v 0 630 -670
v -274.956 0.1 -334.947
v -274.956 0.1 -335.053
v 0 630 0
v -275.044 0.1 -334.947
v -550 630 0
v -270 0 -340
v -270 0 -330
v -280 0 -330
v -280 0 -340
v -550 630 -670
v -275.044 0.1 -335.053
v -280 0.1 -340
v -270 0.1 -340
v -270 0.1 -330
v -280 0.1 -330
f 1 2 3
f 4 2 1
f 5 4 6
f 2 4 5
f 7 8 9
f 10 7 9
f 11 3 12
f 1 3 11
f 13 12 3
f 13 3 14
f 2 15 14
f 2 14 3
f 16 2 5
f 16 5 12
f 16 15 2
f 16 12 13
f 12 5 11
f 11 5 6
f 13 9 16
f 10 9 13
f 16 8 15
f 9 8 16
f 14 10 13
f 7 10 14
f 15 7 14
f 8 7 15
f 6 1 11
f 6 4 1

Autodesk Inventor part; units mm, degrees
ref_plane "YZ Plane" through (0, 0, 0) normal (1, 0, 0) x (0, 1, 0)
ref_plane "XZ Plane" through (0, 0, 0) normal (0, 1, 0) x (-1, 0, 0)
ref_plane "XY Plane" through (0, 0, 0) normal (0, 0, 1) x (1, 0, 0)
sketch "Sketch1" plane through (0, 0, 0) normal (0, 1, 0) x (-1, 0, 0)
  line L0 (0, 0) -> (550, 0)
  line L1 (550, 0) -> (550, -670)
  line L2 (550, -670) -> (0, -670)
  line L3 (0, -670) -> (0, 0)
  dimension "d0" = 670
  dimension "d1" = 550
extrude "Extrusion1" add sketch "Sketch1" along normal blind 630
sketch "Sketch5" plane through (0, 0, 0) normal (1, 0, 0) x (0, 0, -1)
  line L0 (0, 630) -> (0, 0)
  line L1 (0, 0) -> (335, 0)
  line L2 (0, 0) -> (670, 0) projected
  line L3 (0, 630) -> (335, 0)
extrude "Extrusion2" cut sketch "Sketch5" against normal through all
sketch "Sketch6" plane through (0, 0, -670) normal (1, 0, 0) x (0, 0, -1)
  line L0 (-670, 630) -> (-335, 0) projected
  line L1 (-335, 0) -> (0, 630)
  line L2 (0, 630) -> (0, 0)
  line L3 (0, 0) -> (-335, 0)
  point P0 (-670, 0)
extrude "Extrusion3" cut sketch "Sketch6" against normal through all
sketch "Sketch8" plane through (0, 0, 0) normal (0, 0, 1) x (1, 0, 0)
  line L0 (-550, 630) -> (0, 630) projected
  line L1 (-550, 0) -> (-550, 630) projected
  line L2 (-550, 630) -> (-550, 0)
  line L3 (-550, 0) -> (-275, 0)
  line L4 (-275, 0) -> (-550, 630)
  point P0 (0, 0)
  dimension "d8" = 275
extrude "Extrusion4" cut sketch "Sketch8" against normal through all
sketch "Sketch9" plane through (0, 0, 0) normal (0, 0, 1) x (1, 0, 0)
  line L0 (0, 0) -> (-275, 0) projected
  line L1 (-275, 0) -> (0, 630)
  line L2 (0, 630) -> (0, 0)
extrude "Extrusion5" cut sketch "Sketch9" against normal through all
sketch "Sketch10" plane through (0, 0, 0) normal (0, 1, 0) x (-1, 0, 0)
  line L0 (270, -330) -> (280, -330)
  line L1 (280, -330) -> (280, -340)
  line L2 (280, -340) -> (270, -340)
  line L3 (270, -340) -> (270, -330)
  line L4 (550, 0) -> (0, 0) projected
  line L5 (0, 0) -> (0, -670) projected
  dimension "d13" = 10
  dimension "d14" = 10
  dimension "d15" = 330
  dimension "d16" = 270
extrude "Extrusion6" add sketch "Sketch10" along normal blind 0.1
properties part number "FieldofView"
